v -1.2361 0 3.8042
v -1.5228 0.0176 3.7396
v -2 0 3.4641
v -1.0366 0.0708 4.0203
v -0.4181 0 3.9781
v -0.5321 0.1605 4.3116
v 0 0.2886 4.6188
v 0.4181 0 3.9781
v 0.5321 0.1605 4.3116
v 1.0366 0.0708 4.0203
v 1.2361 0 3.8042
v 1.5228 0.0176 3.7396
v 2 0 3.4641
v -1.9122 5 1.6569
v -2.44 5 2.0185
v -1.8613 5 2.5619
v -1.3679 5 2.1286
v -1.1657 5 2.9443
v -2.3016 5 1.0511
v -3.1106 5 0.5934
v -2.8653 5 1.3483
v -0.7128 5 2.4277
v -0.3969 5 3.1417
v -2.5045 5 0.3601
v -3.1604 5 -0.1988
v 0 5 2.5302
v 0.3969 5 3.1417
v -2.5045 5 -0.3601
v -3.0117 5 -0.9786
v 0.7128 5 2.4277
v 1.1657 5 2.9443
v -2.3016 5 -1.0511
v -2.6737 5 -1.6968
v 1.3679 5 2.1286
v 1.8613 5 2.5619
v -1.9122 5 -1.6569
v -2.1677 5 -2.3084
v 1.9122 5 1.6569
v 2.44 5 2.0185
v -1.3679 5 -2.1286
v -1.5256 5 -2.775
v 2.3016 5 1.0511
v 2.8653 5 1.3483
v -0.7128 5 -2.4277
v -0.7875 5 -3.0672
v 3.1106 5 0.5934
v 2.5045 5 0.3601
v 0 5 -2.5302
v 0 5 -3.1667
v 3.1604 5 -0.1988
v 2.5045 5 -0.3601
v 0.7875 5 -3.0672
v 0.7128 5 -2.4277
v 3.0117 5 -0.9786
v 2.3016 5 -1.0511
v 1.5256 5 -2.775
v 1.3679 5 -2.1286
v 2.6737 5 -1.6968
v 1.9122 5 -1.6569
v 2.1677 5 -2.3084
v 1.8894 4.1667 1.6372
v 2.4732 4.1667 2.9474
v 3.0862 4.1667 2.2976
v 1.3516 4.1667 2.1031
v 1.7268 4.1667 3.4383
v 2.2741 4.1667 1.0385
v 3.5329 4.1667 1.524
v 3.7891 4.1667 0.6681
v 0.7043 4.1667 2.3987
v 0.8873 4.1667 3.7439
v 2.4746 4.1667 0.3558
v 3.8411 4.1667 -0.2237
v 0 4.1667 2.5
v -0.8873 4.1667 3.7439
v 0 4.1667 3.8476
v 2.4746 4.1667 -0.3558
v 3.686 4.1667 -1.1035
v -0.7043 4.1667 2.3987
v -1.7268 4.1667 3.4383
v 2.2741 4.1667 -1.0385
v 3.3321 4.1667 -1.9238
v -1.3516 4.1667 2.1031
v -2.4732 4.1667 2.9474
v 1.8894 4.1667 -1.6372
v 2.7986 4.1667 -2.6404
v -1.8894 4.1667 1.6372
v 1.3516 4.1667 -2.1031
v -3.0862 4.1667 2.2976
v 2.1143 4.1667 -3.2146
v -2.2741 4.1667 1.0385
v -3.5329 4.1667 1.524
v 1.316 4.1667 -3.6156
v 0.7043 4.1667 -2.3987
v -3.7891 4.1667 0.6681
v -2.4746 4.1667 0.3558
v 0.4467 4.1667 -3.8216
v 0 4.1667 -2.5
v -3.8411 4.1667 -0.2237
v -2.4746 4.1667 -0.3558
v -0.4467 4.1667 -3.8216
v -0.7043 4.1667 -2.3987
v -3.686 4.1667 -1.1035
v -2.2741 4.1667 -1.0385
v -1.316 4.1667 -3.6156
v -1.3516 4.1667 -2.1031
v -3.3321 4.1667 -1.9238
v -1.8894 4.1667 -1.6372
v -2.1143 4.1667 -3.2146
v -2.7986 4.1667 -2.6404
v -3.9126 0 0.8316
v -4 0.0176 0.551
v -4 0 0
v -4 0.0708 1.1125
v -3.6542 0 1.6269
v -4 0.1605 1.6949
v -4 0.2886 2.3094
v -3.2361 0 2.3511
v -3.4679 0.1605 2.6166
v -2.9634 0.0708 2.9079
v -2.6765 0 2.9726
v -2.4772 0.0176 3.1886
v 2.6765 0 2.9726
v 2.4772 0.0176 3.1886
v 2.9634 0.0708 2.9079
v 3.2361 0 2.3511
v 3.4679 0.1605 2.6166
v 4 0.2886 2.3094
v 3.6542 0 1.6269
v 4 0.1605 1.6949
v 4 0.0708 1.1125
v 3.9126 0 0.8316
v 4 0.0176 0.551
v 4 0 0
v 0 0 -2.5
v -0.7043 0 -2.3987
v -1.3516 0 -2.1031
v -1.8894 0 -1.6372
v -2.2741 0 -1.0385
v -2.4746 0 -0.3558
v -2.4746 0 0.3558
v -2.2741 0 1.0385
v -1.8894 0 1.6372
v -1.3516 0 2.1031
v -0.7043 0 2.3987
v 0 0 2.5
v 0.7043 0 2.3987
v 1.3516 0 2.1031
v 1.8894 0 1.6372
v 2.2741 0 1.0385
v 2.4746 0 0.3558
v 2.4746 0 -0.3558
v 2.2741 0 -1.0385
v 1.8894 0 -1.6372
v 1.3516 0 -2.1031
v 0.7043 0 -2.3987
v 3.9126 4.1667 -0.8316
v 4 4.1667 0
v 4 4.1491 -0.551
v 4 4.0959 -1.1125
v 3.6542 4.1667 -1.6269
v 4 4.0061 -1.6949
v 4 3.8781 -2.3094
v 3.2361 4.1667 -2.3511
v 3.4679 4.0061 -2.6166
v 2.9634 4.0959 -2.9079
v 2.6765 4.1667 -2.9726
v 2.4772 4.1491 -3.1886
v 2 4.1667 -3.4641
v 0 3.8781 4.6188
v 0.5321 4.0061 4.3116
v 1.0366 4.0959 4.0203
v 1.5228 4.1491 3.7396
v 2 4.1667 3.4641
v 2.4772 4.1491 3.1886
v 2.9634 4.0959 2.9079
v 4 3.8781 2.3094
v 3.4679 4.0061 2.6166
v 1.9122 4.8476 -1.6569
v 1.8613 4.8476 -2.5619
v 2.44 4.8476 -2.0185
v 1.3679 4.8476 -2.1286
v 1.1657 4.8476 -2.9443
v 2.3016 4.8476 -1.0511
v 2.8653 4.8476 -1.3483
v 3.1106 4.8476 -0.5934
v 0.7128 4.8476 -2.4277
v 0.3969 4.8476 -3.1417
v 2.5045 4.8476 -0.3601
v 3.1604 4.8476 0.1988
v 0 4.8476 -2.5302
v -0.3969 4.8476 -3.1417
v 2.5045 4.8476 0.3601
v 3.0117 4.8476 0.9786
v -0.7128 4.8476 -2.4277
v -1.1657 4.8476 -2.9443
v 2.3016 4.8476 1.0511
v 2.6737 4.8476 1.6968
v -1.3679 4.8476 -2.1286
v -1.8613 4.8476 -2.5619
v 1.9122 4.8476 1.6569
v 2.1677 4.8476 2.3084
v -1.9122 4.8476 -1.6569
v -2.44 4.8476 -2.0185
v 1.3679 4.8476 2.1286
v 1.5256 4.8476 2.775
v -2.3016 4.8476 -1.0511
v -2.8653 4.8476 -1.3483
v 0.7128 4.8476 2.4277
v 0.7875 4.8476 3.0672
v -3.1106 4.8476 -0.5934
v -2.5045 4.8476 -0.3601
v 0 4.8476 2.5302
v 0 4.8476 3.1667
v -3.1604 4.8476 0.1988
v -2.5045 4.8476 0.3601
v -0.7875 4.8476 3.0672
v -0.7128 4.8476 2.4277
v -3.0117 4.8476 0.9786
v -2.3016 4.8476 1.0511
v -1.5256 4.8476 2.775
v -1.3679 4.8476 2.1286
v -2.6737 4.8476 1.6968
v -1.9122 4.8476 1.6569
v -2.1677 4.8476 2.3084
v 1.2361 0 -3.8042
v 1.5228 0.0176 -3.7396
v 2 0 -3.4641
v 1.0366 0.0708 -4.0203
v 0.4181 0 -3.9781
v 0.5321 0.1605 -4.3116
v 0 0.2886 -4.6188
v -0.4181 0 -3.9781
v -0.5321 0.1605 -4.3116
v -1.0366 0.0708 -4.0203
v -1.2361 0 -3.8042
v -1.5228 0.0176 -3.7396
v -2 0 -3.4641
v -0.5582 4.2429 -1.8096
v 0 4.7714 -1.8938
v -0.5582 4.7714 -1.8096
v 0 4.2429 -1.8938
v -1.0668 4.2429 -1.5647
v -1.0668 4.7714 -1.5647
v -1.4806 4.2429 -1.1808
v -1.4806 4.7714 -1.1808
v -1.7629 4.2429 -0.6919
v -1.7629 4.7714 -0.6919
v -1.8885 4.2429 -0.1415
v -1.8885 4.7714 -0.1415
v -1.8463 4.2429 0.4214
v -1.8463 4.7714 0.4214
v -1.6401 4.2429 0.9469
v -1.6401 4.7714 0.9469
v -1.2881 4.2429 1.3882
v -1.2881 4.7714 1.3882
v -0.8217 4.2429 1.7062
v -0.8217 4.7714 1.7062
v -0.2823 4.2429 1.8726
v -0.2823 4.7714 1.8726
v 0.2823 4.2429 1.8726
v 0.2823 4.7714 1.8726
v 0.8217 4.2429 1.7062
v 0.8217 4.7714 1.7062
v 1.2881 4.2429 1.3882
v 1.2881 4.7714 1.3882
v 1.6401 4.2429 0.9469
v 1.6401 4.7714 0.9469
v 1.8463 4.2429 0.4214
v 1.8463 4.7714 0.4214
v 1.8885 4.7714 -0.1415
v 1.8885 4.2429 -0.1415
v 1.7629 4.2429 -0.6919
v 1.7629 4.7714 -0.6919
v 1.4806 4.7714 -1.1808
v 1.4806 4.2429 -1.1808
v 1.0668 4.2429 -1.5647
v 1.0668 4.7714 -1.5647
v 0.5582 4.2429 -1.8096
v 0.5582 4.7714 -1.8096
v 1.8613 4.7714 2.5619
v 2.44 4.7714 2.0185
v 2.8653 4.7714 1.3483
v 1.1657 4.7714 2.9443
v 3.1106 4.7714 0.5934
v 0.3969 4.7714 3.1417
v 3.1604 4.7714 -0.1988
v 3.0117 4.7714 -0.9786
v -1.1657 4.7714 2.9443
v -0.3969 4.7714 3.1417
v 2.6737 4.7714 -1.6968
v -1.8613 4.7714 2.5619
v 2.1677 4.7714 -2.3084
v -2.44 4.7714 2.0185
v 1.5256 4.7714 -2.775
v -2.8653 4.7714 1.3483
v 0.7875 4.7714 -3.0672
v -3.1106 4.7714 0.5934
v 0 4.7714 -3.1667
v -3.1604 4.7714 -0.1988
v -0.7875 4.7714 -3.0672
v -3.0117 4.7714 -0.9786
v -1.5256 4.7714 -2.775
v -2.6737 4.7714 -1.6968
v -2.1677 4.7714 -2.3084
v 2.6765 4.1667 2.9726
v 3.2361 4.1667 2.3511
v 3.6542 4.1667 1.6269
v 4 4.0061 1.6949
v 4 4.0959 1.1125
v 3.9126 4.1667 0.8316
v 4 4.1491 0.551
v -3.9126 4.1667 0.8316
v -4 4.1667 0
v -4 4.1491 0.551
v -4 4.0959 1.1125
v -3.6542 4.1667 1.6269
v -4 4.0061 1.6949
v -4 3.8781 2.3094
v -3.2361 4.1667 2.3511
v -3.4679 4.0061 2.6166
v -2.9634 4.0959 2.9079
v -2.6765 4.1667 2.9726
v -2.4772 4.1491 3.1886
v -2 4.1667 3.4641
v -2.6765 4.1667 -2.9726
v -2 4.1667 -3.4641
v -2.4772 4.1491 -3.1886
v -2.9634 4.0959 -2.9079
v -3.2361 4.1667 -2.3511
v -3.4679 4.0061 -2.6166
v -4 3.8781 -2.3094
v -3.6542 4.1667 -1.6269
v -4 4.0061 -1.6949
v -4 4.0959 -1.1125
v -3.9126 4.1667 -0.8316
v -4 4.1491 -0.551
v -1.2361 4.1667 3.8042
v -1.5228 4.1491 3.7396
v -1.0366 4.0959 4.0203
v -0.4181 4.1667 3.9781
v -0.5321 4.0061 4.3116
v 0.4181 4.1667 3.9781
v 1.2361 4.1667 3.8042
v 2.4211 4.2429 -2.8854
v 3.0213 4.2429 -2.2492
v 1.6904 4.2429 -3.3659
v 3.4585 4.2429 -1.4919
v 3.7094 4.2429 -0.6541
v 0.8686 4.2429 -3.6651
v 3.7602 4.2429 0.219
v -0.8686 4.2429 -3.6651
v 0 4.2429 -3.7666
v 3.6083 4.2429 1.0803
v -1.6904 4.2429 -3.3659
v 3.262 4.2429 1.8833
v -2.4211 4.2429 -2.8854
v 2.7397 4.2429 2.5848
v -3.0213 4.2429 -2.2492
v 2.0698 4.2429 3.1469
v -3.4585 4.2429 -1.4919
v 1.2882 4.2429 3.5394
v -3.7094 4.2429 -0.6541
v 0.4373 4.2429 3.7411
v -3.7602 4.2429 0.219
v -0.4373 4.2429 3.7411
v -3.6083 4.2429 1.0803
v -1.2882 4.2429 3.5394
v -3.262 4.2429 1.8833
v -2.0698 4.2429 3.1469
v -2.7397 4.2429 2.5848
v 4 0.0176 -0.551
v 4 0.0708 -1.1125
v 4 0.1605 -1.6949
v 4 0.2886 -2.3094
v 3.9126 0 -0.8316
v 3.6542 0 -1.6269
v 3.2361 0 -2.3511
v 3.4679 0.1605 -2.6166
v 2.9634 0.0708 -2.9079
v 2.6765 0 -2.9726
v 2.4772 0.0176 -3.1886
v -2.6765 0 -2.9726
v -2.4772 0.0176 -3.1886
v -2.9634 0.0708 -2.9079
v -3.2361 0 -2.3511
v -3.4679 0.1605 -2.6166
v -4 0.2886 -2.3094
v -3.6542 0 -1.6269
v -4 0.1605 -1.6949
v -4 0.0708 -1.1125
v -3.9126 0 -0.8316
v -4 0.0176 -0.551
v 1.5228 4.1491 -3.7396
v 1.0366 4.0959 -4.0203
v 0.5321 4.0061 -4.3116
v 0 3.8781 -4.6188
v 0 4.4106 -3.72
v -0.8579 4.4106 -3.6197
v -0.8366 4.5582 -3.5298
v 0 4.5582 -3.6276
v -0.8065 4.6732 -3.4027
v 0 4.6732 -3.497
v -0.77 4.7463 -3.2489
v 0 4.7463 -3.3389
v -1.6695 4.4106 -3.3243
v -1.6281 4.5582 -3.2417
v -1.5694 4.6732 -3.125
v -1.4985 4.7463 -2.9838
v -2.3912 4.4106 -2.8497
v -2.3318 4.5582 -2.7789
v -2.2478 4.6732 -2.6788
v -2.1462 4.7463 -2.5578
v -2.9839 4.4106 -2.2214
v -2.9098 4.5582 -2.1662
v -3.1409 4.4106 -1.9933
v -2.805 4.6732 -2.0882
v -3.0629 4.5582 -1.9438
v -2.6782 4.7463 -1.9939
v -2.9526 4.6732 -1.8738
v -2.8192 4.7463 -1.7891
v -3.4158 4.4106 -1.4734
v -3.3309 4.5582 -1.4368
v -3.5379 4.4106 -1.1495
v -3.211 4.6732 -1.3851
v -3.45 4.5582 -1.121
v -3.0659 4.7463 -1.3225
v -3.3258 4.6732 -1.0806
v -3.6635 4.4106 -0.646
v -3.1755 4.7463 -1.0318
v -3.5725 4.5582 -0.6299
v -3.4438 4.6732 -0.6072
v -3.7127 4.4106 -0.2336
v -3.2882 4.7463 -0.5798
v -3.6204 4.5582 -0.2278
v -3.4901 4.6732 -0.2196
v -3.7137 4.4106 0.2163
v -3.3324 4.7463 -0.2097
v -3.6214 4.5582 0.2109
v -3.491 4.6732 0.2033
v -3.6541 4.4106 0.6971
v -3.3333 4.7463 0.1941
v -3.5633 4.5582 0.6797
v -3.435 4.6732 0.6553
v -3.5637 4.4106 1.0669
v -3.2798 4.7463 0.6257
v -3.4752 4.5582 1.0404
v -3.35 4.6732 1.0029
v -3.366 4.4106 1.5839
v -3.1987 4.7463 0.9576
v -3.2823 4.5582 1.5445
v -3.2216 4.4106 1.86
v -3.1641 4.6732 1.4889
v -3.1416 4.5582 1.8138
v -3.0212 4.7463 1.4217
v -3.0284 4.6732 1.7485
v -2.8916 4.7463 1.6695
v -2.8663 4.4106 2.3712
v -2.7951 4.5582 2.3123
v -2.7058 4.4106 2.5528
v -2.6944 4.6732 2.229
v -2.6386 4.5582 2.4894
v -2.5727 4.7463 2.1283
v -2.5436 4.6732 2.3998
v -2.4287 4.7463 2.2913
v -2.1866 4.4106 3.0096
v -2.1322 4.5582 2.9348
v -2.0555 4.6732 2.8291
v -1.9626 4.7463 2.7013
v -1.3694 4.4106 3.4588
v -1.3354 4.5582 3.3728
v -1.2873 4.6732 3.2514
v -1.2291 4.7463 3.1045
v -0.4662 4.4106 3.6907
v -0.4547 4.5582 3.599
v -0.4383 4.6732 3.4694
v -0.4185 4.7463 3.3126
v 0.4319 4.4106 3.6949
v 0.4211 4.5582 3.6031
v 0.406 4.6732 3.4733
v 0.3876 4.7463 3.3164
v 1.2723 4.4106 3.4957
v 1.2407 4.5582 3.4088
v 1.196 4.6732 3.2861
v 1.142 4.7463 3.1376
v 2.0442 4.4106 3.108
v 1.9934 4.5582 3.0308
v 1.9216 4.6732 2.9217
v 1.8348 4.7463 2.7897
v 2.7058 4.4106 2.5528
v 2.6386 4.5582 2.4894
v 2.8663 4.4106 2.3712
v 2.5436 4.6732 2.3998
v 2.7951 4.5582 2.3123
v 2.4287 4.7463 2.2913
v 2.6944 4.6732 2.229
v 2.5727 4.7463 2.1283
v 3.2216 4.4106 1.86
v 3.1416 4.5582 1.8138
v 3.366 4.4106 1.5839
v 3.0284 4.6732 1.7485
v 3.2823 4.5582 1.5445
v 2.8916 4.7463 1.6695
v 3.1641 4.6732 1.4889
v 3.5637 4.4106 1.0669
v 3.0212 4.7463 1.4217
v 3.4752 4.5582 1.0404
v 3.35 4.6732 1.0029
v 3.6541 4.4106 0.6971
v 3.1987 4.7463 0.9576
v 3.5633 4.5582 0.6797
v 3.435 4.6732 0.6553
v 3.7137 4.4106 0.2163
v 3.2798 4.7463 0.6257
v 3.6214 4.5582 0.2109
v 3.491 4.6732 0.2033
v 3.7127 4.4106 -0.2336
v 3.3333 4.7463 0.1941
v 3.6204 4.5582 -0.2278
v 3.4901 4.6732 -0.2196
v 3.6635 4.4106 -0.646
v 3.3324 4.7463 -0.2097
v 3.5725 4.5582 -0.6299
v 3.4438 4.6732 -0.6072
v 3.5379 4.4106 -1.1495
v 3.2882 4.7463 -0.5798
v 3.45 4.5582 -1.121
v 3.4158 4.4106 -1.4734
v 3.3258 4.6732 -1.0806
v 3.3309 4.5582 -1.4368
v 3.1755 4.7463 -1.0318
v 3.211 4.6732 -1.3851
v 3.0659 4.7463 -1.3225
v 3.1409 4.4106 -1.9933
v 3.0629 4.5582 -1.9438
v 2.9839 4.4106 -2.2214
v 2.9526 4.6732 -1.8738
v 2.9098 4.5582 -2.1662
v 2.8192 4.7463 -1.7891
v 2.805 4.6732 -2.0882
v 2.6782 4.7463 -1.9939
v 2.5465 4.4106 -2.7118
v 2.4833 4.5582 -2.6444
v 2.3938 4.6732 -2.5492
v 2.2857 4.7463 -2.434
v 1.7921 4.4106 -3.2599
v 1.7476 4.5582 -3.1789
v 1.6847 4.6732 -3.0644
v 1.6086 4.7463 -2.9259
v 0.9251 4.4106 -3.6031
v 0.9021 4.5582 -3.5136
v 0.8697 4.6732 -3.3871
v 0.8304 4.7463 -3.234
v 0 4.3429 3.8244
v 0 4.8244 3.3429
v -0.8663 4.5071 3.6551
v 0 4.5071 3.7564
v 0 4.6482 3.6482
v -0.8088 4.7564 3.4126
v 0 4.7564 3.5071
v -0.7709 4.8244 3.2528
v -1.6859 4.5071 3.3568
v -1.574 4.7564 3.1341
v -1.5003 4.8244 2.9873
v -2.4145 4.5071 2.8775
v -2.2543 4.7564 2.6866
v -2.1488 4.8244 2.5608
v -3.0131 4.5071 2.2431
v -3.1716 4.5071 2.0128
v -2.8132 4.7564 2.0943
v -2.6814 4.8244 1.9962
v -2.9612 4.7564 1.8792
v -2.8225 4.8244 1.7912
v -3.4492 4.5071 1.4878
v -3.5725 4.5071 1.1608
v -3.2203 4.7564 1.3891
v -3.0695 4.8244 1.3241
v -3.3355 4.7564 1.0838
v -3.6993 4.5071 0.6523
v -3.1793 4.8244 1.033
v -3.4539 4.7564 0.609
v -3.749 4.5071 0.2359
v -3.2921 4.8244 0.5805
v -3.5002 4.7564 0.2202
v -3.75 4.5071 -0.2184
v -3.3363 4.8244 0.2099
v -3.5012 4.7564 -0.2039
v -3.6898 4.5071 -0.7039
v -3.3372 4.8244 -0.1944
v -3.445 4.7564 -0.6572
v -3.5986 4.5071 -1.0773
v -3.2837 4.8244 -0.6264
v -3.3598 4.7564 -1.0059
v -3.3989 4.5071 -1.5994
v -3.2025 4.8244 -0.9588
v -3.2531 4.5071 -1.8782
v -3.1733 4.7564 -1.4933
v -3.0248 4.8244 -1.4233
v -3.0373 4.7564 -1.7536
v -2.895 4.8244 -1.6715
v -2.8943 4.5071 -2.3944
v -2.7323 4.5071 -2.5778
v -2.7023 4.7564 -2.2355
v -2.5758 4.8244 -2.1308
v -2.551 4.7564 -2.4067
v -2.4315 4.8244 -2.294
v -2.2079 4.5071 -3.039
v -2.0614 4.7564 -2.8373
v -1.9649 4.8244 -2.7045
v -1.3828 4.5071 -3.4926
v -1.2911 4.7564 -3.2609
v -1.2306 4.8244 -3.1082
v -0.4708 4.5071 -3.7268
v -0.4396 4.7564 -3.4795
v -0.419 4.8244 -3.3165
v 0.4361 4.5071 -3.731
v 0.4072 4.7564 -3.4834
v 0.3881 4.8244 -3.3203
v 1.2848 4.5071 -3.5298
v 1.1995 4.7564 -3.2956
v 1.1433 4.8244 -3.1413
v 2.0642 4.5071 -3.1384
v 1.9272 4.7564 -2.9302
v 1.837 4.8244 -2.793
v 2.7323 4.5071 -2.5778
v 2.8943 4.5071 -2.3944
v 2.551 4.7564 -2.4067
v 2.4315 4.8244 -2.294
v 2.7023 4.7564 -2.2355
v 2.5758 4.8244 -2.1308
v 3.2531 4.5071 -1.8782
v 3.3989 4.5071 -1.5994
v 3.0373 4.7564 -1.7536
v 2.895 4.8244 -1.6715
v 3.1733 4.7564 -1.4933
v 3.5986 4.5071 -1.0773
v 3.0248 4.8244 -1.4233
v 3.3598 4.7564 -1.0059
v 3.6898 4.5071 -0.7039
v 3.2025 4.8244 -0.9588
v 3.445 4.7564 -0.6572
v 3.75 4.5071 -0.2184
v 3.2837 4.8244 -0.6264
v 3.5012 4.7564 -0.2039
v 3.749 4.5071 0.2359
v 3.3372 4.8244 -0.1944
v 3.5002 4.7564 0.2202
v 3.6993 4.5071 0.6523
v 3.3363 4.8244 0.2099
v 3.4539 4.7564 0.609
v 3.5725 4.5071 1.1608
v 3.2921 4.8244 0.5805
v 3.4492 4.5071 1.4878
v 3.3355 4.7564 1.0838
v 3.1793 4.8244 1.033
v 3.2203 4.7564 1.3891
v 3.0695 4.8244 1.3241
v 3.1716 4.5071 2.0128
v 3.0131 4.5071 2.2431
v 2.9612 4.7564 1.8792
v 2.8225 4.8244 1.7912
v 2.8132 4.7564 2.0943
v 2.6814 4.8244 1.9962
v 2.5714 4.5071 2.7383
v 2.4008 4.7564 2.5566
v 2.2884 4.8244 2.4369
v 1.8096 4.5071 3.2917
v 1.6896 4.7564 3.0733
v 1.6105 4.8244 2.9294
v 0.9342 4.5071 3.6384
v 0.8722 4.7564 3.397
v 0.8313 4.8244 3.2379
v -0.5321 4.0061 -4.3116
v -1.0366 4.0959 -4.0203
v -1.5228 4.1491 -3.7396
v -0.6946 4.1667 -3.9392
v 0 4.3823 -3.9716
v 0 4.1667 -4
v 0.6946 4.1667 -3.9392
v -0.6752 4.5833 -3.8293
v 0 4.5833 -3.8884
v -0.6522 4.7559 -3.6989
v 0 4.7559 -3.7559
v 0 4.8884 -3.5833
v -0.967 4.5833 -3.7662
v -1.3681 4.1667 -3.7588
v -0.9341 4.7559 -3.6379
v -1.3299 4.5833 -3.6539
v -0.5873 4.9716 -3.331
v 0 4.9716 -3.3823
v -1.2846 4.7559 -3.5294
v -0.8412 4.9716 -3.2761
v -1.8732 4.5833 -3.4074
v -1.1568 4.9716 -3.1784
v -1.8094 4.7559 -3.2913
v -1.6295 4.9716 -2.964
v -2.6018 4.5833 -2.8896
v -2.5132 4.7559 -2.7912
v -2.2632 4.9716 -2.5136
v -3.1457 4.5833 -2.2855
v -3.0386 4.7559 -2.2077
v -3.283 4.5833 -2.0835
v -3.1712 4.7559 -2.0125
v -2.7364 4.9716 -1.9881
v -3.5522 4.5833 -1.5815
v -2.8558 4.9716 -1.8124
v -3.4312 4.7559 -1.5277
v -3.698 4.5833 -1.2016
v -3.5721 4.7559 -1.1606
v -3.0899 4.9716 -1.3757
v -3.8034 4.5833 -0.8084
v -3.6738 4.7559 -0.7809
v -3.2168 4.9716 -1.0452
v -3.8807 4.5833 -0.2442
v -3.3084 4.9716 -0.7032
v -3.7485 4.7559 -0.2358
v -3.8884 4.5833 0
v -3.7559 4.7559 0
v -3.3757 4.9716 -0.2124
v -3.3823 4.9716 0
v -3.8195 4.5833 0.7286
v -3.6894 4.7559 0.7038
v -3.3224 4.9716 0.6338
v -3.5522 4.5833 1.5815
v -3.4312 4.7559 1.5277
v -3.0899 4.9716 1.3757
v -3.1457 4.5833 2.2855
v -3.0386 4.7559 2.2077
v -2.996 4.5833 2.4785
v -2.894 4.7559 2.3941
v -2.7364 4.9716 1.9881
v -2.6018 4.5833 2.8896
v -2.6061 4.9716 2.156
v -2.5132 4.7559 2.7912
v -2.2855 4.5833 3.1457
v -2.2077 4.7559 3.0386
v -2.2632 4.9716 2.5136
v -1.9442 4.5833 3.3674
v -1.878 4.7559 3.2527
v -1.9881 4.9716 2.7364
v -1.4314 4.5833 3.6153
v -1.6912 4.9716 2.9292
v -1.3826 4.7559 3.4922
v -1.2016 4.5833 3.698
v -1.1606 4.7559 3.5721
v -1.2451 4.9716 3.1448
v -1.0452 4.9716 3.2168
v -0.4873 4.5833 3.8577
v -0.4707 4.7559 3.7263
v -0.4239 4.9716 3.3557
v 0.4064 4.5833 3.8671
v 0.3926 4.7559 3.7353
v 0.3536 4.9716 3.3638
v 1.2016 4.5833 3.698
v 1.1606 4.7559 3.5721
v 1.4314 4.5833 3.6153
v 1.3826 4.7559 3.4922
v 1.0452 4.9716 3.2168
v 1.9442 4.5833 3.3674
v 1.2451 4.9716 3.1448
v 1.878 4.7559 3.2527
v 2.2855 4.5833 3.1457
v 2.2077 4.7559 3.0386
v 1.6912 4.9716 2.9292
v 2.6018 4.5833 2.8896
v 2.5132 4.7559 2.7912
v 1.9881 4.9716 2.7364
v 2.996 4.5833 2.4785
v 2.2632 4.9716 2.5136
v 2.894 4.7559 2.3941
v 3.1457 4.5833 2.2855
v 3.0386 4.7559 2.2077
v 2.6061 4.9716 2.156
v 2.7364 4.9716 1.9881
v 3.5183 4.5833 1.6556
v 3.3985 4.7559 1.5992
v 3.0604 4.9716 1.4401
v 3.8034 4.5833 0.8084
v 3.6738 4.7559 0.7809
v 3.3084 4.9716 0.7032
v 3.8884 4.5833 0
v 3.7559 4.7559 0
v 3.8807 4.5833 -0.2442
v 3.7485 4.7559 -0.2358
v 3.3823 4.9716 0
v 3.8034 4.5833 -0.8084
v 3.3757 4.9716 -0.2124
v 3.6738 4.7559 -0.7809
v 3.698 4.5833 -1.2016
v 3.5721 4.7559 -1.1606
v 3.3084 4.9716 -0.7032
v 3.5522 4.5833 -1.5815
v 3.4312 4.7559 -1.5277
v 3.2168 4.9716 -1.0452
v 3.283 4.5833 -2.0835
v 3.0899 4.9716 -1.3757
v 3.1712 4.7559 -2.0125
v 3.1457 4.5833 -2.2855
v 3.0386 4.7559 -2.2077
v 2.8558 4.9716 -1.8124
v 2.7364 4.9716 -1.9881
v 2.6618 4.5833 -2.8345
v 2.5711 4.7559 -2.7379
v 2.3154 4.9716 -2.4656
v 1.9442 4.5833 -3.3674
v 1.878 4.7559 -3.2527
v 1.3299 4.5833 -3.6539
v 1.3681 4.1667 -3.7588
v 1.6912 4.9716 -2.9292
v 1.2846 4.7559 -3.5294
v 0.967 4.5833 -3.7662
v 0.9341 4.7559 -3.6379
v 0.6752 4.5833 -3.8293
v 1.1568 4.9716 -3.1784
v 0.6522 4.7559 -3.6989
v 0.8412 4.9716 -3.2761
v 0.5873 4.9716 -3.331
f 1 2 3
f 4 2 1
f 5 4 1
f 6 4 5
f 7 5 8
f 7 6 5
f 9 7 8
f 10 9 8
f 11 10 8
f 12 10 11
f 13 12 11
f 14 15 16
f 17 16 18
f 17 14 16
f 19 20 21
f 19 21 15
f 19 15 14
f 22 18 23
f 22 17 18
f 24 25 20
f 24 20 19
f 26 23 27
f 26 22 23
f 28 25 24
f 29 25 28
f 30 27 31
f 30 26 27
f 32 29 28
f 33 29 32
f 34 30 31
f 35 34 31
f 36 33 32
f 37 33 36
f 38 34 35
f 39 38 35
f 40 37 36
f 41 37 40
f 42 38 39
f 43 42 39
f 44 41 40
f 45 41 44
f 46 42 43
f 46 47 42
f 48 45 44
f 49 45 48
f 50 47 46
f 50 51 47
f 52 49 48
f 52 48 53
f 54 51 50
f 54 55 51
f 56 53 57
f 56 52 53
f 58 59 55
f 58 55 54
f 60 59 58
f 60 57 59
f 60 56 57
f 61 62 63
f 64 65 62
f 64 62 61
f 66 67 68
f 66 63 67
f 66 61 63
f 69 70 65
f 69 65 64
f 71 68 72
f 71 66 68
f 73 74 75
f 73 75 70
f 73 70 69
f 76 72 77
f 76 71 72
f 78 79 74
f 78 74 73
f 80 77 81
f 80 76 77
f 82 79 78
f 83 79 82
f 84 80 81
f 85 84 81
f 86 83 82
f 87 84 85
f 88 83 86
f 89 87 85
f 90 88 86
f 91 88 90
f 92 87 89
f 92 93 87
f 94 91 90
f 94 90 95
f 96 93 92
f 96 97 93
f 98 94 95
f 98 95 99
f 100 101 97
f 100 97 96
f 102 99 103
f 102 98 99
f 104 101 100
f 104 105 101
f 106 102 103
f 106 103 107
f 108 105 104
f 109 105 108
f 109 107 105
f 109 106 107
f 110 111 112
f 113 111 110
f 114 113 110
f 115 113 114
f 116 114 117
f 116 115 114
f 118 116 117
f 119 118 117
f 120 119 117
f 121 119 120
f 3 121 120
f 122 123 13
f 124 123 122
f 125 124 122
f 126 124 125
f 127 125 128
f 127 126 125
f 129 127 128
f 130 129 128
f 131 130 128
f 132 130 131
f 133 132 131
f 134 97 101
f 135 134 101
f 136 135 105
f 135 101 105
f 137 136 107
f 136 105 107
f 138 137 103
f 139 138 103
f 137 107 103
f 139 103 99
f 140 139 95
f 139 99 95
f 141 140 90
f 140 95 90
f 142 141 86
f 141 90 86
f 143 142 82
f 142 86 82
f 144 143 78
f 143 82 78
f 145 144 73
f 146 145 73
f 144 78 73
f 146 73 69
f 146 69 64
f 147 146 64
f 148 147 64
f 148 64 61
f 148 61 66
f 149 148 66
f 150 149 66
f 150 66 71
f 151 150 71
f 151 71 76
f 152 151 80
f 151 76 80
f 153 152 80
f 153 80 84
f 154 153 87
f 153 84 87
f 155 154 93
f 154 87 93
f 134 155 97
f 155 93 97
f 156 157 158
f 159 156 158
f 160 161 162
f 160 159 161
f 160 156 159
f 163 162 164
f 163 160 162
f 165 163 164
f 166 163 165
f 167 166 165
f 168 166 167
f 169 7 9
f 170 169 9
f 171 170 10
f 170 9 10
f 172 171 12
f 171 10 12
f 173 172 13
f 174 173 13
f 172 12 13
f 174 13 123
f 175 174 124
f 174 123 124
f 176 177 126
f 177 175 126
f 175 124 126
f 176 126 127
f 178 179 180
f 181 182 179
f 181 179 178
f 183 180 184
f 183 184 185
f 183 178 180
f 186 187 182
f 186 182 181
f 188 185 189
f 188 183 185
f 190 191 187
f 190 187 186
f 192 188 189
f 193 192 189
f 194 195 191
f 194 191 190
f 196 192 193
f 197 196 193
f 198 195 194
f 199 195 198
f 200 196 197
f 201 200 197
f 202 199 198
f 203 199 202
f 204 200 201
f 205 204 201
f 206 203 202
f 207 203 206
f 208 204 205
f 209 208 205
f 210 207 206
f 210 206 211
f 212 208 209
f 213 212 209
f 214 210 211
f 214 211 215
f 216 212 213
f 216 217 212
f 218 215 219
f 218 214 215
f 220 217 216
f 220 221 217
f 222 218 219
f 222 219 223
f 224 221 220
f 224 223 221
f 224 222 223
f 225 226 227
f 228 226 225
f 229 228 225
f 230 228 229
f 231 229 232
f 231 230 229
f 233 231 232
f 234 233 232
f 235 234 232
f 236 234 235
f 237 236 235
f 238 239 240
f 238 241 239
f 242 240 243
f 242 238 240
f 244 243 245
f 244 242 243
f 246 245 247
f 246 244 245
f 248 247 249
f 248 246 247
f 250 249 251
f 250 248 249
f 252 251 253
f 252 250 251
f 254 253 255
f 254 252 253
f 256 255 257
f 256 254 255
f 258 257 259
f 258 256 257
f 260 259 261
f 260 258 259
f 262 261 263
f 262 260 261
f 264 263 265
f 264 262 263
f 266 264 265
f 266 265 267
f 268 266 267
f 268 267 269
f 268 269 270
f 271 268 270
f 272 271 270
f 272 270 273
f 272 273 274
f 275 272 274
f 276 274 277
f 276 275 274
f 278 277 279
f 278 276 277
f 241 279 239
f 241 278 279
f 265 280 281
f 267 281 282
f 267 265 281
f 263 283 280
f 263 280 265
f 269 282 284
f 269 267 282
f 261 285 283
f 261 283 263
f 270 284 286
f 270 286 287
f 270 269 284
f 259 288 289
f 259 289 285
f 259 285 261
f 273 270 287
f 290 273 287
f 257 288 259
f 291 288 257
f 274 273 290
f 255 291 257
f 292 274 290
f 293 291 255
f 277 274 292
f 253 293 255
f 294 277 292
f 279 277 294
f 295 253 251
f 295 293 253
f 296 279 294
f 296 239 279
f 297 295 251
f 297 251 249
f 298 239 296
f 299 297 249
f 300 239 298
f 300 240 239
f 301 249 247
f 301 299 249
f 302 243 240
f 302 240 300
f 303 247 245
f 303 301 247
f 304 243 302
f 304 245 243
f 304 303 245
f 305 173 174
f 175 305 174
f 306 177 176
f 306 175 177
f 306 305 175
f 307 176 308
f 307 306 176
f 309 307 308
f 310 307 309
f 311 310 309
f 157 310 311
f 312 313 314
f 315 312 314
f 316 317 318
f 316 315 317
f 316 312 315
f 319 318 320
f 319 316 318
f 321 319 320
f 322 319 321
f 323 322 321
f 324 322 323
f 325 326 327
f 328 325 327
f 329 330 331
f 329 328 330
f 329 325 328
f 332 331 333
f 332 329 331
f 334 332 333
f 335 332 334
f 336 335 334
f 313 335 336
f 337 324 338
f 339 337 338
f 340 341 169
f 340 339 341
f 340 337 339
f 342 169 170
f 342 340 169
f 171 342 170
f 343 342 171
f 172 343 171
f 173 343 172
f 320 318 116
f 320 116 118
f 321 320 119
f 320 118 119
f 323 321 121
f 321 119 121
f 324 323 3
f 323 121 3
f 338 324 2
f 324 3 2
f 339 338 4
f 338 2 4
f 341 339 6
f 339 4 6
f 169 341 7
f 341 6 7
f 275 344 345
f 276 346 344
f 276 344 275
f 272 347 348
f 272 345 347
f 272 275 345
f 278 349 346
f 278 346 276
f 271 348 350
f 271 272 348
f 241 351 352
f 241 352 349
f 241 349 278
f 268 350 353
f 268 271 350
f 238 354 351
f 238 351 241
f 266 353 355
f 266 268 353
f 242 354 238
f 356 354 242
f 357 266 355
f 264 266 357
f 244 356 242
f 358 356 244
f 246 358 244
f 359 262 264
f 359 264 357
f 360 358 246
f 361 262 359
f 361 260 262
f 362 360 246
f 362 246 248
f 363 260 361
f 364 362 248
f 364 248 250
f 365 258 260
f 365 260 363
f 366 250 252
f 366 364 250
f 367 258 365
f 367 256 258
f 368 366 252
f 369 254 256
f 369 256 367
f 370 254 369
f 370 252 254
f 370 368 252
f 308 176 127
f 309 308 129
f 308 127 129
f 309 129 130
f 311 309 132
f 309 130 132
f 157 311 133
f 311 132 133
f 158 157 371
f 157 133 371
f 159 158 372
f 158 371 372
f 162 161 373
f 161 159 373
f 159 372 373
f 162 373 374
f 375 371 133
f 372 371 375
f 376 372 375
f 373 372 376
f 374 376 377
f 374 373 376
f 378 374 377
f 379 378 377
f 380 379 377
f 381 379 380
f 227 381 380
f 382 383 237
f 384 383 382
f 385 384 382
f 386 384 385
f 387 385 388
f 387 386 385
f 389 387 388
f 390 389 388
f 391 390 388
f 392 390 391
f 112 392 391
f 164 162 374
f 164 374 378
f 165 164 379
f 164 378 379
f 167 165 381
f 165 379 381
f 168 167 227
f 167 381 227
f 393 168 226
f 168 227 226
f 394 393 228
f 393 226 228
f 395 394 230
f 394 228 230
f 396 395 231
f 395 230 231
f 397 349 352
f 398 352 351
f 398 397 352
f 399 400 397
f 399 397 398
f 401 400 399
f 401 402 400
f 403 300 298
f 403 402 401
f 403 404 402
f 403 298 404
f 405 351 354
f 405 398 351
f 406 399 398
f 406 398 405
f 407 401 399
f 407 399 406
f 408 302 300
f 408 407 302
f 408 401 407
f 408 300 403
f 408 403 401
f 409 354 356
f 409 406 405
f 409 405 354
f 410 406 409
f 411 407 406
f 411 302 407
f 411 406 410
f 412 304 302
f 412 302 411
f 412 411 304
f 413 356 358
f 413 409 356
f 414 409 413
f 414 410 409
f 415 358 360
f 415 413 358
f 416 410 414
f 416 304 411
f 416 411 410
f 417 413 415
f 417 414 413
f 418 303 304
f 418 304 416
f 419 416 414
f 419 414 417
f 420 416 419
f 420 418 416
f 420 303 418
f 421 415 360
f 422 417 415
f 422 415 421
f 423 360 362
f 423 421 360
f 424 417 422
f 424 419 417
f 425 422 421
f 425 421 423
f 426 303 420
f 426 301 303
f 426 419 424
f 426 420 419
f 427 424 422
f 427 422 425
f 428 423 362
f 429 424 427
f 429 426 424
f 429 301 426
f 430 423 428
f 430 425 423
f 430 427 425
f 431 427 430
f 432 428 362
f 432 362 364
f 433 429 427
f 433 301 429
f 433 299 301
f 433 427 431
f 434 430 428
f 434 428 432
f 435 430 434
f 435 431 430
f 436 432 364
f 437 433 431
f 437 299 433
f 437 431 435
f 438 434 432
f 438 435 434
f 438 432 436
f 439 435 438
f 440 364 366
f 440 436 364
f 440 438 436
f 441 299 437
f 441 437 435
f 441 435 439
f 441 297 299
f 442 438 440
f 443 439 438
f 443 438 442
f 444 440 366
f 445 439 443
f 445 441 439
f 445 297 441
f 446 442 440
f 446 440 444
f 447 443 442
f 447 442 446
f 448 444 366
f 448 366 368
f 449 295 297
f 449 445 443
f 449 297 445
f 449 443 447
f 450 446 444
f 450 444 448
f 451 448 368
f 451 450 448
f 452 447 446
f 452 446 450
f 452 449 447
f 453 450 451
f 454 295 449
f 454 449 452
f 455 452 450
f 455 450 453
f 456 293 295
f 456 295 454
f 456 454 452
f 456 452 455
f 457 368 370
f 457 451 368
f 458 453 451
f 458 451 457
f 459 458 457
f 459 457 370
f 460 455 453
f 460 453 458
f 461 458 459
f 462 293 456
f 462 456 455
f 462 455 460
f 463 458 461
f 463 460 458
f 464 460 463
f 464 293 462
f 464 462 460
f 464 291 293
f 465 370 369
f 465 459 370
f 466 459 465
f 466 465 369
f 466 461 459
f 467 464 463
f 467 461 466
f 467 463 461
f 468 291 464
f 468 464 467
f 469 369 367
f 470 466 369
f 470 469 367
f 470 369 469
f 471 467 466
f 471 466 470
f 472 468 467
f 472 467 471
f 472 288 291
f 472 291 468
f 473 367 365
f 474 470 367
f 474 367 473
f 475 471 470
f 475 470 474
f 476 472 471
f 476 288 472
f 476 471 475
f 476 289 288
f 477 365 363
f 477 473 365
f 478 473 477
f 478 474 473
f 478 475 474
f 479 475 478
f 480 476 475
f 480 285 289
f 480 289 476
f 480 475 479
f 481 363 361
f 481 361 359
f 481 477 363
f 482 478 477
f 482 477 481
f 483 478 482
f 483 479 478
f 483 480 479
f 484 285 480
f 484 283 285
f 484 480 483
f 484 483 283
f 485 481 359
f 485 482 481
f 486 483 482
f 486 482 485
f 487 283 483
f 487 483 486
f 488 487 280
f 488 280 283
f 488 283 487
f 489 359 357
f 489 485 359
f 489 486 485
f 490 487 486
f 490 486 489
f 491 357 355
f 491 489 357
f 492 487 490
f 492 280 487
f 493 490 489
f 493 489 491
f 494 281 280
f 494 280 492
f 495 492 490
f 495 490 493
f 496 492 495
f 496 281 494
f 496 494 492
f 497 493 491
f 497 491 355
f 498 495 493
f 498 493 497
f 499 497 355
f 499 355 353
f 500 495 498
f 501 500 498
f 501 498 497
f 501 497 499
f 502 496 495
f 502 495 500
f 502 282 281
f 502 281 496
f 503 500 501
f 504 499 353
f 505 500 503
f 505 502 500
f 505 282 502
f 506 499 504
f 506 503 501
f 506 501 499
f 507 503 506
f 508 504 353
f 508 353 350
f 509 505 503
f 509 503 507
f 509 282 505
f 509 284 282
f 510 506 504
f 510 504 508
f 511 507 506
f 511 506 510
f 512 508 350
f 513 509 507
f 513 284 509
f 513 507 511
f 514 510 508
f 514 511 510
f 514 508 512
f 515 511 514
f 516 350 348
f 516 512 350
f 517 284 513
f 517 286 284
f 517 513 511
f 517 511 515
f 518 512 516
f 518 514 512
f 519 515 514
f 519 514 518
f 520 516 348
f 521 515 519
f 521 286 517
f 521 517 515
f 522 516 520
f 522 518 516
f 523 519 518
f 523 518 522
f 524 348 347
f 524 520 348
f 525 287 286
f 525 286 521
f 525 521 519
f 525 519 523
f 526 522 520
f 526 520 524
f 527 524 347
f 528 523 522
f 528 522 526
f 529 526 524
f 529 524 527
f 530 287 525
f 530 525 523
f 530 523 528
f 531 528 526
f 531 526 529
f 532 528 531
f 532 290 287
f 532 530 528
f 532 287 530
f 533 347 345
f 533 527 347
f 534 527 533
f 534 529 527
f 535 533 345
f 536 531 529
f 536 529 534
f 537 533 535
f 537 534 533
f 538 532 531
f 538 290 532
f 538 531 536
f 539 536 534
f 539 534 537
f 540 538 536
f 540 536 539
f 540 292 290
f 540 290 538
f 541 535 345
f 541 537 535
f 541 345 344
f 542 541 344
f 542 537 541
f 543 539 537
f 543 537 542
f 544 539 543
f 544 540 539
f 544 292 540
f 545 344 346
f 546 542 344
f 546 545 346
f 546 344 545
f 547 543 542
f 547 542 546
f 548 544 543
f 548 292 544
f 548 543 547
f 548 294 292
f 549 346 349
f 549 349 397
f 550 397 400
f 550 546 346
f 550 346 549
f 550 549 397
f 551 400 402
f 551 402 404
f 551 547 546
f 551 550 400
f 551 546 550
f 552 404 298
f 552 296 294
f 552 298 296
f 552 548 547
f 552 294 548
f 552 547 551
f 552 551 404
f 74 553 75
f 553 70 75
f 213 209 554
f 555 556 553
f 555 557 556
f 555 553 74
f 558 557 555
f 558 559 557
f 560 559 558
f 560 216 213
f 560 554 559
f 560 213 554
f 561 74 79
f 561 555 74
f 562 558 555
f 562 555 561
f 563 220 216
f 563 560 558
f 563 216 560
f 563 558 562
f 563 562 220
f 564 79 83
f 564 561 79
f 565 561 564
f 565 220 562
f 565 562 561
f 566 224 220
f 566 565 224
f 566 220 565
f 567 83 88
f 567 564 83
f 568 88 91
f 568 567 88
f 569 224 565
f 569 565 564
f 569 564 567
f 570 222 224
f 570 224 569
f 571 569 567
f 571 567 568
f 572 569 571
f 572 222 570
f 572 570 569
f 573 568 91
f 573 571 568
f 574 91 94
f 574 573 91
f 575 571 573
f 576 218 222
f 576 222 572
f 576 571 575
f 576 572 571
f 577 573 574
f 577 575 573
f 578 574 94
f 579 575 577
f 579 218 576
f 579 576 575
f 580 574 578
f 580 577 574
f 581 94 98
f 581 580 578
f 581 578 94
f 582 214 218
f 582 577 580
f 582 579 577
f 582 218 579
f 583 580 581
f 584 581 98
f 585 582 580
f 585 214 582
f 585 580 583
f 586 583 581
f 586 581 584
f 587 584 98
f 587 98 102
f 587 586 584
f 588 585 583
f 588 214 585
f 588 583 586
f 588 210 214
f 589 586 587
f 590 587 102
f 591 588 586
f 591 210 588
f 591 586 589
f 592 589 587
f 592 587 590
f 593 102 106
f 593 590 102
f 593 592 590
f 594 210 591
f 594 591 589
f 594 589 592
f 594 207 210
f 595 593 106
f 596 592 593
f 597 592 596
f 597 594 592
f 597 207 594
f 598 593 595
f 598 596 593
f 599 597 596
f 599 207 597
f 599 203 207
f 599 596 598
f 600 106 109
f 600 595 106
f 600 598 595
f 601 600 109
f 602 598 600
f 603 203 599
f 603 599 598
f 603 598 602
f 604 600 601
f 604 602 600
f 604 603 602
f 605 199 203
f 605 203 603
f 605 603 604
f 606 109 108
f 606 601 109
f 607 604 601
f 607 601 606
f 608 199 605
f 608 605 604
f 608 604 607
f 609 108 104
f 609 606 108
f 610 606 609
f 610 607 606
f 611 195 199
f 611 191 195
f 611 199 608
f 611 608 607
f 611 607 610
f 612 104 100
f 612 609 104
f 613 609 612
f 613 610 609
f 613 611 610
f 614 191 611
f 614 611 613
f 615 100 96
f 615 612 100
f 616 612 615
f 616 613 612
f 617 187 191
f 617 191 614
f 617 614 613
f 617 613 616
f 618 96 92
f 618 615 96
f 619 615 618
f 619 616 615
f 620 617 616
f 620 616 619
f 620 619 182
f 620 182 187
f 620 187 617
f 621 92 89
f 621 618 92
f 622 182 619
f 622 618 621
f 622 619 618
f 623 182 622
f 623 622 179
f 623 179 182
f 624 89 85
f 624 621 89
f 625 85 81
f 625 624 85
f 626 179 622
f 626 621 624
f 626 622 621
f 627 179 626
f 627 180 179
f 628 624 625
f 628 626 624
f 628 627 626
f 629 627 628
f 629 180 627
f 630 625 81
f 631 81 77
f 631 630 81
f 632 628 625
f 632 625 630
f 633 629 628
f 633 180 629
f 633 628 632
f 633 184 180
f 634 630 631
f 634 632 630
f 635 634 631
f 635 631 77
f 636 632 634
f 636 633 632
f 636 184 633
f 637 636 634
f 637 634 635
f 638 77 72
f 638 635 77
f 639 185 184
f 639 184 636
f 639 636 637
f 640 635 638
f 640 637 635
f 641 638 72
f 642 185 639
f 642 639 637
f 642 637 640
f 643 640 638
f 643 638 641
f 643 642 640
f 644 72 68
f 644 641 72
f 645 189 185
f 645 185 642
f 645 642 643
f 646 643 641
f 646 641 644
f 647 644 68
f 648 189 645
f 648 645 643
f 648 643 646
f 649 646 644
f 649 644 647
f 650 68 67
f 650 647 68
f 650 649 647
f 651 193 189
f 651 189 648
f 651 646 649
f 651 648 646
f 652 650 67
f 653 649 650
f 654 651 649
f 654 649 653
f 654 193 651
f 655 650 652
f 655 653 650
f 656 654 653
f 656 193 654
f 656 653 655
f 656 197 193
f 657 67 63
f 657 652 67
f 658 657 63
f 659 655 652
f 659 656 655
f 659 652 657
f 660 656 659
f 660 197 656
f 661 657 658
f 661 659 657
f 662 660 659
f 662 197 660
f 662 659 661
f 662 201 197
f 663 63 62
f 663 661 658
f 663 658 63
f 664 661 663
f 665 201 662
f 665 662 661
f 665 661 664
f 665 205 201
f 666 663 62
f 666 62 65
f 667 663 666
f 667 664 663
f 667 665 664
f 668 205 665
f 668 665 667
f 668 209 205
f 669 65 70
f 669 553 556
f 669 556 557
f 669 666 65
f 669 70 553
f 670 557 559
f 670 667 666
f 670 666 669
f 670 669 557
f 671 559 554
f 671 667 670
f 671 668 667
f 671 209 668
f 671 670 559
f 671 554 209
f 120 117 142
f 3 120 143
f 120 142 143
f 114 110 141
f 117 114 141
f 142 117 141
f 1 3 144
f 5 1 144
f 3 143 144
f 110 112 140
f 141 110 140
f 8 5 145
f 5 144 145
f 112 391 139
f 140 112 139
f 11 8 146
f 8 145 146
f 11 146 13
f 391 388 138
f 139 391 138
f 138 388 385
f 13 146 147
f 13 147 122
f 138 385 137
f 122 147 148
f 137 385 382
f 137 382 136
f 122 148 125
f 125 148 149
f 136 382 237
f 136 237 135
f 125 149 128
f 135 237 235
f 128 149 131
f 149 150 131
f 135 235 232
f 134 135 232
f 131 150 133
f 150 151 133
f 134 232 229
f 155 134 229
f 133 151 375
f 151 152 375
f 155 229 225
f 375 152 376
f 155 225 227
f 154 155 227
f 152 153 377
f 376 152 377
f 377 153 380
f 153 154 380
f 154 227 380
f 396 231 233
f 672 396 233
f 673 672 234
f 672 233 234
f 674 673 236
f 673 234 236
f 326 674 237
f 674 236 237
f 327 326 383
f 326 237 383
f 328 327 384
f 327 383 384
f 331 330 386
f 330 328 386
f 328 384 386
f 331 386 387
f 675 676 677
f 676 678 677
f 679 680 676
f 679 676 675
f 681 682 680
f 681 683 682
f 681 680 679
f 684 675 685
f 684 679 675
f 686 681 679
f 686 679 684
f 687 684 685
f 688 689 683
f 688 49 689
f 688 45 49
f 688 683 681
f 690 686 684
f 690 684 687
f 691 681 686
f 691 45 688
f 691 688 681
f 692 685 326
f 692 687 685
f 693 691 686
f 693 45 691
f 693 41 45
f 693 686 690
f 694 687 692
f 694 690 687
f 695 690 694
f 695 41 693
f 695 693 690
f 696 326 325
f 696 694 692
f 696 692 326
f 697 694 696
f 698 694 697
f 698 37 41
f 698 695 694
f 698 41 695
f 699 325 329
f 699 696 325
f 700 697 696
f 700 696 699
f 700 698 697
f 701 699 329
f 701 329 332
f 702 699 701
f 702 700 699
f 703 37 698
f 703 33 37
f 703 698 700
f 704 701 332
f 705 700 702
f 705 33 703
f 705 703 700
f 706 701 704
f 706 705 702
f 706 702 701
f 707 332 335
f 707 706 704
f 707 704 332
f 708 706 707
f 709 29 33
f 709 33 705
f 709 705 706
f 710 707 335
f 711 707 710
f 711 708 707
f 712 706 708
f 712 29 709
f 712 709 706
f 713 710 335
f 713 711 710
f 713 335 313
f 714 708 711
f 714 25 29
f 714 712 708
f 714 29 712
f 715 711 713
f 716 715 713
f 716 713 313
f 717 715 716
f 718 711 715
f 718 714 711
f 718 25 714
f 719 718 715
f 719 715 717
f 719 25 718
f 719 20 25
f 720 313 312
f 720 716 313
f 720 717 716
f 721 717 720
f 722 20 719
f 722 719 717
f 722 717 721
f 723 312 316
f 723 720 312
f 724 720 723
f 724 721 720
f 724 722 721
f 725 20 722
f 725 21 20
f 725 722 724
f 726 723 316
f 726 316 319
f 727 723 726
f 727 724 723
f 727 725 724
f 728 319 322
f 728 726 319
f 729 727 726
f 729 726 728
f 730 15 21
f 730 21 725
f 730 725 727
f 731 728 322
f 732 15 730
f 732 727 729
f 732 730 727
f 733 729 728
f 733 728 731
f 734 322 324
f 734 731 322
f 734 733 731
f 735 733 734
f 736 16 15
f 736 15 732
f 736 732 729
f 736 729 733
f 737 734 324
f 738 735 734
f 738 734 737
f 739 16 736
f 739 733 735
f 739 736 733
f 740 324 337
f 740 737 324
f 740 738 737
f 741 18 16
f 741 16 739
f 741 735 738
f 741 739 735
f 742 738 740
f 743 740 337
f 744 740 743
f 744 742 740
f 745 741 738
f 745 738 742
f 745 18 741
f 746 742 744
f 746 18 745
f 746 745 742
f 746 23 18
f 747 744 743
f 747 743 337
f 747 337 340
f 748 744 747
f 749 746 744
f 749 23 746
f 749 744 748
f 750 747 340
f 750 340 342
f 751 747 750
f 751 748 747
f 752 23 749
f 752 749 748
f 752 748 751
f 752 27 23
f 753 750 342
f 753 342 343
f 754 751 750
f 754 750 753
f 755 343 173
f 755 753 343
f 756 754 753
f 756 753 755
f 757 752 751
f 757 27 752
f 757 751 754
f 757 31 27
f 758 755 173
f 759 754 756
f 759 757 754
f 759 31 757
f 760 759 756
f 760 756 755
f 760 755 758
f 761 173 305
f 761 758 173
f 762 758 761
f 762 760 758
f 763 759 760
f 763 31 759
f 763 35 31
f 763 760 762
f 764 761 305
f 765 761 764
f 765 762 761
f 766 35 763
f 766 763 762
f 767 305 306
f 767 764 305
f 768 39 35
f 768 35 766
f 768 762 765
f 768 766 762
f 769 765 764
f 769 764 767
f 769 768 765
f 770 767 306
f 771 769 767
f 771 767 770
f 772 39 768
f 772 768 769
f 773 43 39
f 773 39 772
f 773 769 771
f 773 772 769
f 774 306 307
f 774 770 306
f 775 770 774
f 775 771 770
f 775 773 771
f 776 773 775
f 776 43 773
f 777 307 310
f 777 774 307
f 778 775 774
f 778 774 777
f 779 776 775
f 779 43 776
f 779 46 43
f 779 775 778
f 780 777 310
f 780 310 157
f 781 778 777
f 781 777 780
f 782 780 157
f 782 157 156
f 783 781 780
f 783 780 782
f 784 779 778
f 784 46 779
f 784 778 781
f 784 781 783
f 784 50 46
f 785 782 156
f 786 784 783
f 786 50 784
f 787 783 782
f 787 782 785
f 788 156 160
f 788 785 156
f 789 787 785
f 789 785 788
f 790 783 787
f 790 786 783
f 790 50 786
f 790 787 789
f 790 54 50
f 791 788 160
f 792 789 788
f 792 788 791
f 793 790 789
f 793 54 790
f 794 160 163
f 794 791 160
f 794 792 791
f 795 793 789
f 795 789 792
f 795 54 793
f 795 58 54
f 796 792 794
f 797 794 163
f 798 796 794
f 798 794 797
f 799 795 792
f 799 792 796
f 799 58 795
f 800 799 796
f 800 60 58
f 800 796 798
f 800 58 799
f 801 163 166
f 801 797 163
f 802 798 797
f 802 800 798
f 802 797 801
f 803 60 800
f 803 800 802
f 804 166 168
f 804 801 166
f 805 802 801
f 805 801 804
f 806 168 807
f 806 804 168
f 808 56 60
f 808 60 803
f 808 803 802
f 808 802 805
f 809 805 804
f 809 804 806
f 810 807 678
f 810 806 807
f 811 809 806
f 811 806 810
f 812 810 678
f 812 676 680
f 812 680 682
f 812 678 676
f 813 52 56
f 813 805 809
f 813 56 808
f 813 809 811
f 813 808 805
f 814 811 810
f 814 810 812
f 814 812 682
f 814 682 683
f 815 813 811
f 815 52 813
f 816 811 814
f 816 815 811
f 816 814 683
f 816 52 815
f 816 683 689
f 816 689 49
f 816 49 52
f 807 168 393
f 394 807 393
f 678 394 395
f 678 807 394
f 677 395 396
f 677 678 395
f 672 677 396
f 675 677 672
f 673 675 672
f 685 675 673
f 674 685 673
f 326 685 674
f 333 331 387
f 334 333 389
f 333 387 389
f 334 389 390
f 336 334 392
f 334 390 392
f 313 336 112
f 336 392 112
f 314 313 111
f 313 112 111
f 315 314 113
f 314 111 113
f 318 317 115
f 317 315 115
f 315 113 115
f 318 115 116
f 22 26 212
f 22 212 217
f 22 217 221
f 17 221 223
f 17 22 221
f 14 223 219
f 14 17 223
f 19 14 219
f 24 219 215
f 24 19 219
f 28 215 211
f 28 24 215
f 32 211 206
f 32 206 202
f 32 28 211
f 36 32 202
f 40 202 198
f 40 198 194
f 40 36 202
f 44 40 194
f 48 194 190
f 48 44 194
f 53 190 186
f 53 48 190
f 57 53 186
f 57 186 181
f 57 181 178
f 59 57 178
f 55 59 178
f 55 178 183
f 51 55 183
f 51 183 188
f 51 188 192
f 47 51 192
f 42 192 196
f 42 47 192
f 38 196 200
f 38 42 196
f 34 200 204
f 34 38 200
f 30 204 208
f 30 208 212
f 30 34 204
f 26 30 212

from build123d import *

# Parameters (mm, degrees)
EXTRUDE1_DEPTH = 5
SKETCH2_W      = 2.5
SKETCH2_H      = 5


with BuildPart() as part:
    # Sketch1 → Extrude1 (new body)
    with BuildSketch(Plane(origin=(0, 0, 0), x_dir=(1, 0, 0), z_dir=(0, 1, 0))):
        Polygon((0, 4.618802154), (-4, 2.309401077), (-4, -2.309401077), (0, -4.618802154), (4, -2.309401077), (4, 2.309401077), align=None)
    extrude(amount=EXTRUDE1_DEPTH)


with BuildPart() as body_2:
    # Sketch2 → Revolve1 (revolve)
    with BuildSketch(Plane(origin=(0, 0, 0), x_dir=(0, 0, -1), z_dir=(1, 0, 0))):
        with Locations((1.25, 2.5)):
            Rectangle(SKETCH2_W, SKETCH2_H)
    revolve(axis=Axis((0, -2.5, 0), (0, 1, 0)))

    # Boss-Extrude1 cone 1 section (through the dimple's axis) → Boss-Extrude1 (revolve)
    with BuildSketch(Plane(origin=(0, 0, 0), x_dir=(0, 0, -1), z_dir=(1, 0, 0))):
        Polygon((0, 0), (2.5, 0), (0, 2.5), align=None)
    revolve(axis=Axis((0, 0, 0), (0, 1, 0)))

    # Boss-Extrude2 cone 1 section (through the dimple's axis) → Boss-Extrude2 (revolve)
    with BuildSketch(Plane(origin=(0, 5, 0), x_dir=(0, 0, 1), z_dir=(1, 0, 0))):
        Polygon((0, 0), (2.5, 0), (0, 2.5), align=None)
    revolve(axis=Axis((0, 5, 0), (0, -1, 0)))


with BuildPart() as part_1:
    add(part.part)

    # Combine1: cut body 2
    add(body_2.part, mode=Mode.SUBTRACT)

    # Sketch5 → Cut-Revolve3 (revolve, cut)
    with BuildSketch(Plane(origin=(0, 0, 0), x_dir=(0, 0, -1), z_dir=(1, 0, 0))):
        with BuildLine():
            Line((0, 0), (4, 0))
            Line((4, 0), (4.618802154, 0.288552183))
            Line((4.618802154, 0.288552183), (4.618802154, 3.878114484))
            Line((4.618802154, 3.878114484), (4, 4.166666667))
            ThreePointArc((4, 4.166666667), (3.755922318, 4.755922318), (3.166666667, 5))
            Line((3.166666667, 5), (3.166666667, 6.27))
            Line((3.166666667, 6.27), (5.888802154, 6.27))
            Line((5.888802154, 6.27), (5.888802154, -1.27))
            Line((5.888802154, -1.27), (0, -1.27))
            Line((0, -1.27), (0, 0))
        make_face()
    revolve(axis=Axis((0, 0, 0), (0, 1, 0)), mode=Mode.SUBTRACT)

    # Sketch6 → Cut-Revolve4 (revolve, cut)
    with BuildSketch(Plane(origin=(0, 0, 0), x_dir=(0, 0, -1), z_dir=(1, 0, 0)), mode=Mode.PRIVATE) as cut_revolve4_sk:
        with BuildLine():
            Line((0, 4.166666667), (3.8476, 4.166666667))
            ThreePointArc((3.8476, 4.166666667), (3.648159244, 4.648159244), (3.166666667, 4.8476))
            Line((3.166666667, 4.8476), (2.530224442, 4.8476))
            Line((2.530224442, 4.8476), (2.530224442, 6.27))
            Line((2.530224442, 6.27), (0, 6.27))
            Line((0, 6.27), (0, 4.166666667))
        make_face()
    revolve(cut_revolve4_sk.sketch.rotate(Axis((0, 6.27, 0), (0, -1, 0)), 180), axis=Axis((0, 6.27, 0), (0, -1, 0)), mode=Mode.SUBTRACT)


with BuildPart() as body_2_2:
    # Sketch7 → Revolve2 (revolve)
    with BuildSketch(Plane(origin=(0, 0, 0), x_dir=(0, 0, -1), z_dir=(1, 0, 0))):
        with BuildLine():
            Line((1.893782217, 4.242866667), (3.766579964, 4.242866667))
            ThreePointArc((3.766579964, 4.242866667), (3.566430175, 4.620419399), (3.166666667, 4.7714))
            Line((3.166666667, 4.7714), (1.893782217, 4.7714))
            Line((1.893782217, 4.7714), (1.893782217, 4.242866667))
        make_face()
    revolve(axis=Axis((0, 4.242866667, 0), (0, 1, 0)))


solid = Compound([part_1.part, body_2_2.part])
